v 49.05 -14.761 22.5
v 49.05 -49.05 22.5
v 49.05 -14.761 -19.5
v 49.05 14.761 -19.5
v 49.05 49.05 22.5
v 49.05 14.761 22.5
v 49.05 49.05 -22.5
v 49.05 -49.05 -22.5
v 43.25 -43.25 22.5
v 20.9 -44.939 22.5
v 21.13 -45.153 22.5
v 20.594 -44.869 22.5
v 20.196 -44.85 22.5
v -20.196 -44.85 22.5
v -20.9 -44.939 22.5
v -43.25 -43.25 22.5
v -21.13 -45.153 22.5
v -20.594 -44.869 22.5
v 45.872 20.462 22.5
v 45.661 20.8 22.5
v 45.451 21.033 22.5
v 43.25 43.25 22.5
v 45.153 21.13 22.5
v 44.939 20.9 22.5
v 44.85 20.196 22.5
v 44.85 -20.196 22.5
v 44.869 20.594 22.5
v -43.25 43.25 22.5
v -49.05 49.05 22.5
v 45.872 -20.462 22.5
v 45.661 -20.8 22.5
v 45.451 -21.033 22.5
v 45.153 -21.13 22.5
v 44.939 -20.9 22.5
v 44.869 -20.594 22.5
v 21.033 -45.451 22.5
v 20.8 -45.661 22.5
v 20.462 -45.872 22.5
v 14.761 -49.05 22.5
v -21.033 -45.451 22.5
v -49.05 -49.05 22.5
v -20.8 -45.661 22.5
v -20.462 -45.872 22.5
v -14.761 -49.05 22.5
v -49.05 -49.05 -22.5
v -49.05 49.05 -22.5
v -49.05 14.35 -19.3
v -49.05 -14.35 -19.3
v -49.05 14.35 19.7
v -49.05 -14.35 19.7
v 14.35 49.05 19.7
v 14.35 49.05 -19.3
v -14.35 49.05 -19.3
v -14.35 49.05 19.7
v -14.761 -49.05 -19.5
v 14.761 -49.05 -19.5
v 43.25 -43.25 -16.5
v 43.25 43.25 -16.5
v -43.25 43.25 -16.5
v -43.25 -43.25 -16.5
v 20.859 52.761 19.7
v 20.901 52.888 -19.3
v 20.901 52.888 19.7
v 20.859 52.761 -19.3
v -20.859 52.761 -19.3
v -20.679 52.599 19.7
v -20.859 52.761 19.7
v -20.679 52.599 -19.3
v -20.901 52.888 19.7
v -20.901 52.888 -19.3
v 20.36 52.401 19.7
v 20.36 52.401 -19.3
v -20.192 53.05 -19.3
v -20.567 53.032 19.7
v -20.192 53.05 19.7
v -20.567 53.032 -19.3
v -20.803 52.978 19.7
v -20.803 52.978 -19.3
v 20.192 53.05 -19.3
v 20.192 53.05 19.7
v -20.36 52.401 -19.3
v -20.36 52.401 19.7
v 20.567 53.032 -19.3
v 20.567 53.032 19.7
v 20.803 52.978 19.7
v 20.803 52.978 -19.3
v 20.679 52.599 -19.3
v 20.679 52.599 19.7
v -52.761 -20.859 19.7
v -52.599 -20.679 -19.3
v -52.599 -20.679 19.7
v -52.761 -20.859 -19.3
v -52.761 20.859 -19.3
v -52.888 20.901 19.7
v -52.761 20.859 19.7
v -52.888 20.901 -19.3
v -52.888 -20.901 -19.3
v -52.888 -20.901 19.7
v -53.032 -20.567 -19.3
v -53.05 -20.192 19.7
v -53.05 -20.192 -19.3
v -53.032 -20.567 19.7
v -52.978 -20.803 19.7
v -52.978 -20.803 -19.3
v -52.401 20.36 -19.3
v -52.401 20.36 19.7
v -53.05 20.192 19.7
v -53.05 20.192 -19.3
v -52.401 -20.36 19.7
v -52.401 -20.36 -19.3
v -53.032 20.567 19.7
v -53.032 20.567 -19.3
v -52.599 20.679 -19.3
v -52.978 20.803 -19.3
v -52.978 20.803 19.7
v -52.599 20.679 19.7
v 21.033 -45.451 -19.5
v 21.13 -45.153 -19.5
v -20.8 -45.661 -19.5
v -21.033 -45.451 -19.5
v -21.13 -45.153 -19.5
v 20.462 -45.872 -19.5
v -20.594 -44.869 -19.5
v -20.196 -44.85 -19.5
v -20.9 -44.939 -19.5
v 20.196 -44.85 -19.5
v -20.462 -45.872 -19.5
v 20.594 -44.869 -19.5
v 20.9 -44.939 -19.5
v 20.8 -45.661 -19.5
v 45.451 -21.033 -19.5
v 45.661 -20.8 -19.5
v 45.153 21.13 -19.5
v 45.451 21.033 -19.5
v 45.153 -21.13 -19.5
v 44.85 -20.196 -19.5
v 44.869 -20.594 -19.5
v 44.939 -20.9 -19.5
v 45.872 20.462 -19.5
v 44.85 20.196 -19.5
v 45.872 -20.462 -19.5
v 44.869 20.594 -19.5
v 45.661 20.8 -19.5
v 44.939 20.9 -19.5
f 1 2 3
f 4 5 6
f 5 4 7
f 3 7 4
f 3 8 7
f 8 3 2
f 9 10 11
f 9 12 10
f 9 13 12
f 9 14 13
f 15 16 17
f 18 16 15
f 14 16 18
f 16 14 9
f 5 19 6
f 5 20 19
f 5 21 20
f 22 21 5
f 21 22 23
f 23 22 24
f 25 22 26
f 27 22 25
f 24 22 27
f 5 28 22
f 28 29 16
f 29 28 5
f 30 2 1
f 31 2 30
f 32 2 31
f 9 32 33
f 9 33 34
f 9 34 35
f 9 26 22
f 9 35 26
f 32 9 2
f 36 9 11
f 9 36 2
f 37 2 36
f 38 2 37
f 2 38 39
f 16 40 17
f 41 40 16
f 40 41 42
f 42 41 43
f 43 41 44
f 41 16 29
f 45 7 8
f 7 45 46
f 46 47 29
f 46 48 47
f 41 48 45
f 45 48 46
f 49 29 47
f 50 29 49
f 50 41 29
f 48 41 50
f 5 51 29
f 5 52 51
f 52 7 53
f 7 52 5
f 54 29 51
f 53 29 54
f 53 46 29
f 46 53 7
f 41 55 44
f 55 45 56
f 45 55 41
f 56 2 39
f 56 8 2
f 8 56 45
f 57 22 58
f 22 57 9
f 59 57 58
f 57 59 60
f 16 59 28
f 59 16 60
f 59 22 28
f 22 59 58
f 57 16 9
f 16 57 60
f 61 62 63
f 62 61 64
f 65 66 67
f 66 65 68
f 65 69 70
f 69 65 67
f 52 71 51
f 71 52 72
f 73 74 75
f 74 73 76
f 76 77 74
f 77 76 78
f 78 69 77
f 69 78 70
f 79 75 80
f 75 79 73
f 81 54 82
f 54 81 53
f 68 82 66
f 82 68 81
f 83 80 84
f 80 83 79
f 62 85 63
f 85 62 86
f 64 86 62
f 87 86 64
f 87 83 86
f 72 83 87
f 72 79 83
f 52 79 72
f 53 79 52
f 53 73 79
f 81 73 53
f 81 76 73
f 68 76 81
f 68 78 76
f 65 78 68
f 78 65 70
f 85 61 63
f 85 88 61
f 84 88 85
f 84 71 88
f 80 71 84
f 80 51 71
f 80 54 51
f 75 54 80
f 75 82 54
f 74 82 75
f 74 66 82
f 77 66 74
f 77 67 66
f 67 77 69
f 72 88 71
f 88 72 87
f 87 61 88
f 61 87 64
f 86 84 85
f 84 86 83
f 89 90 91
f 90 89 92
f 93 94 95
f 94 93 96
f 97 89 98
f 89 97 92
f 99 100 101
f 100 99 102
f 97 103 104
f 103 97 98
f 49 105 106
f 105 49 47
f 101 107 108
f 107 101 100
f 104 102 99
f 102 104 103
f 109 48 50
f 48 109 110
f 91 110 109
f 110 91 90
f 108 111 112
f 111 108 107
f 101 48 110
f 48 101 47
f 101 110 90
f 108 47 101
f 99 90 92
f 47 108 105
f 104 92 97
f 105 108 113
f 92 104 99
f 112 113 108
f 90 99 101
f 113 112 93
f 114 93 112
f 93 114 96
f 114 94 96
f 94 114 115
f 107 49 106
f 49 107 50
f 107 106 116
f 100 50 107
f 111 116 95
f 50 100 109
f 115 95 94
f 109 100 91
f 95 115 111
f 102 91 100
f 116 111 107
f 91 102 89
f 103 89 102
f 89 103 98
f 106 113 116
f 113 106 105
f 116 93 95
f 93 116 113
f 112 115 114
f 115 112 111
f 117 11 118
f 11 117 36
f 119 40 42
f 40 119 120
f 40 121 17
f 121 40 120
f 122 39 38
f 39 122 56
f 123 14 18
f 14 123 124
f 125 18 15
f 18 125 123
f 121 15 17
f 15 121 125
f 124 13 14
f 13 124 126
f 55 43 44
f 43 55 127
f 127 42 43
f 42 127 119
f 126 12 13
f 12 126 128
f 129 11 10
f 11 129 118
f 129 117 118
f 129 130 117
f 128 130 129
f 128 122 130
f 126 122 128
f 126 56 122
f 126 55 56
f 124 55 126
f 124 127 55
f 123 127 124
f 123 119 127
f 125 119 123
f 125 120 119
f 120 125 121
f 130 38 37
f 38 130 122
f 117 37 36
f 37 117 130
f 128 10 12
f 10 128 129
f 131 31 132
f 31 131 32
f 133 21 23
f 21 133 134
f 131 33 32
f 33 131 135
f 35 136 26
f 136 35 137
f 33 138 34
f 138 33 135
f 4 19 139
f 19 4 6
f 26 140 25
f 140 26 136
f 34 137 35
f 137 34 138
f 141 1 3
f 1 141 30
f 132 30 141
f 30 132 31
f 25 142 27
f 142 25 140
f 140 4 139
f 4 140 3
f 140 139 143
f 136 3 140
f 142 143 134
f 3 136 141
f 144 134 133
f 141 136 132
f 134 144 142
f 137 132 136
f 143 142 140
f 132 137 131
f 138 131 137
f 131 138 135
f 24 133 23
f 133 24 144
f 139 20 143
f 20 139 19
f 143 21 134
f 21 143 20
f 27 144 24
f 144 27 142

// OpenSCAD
// file: bayonet-port-scad/utils/trapezium.scad
/**
 * @file trapezium.scad
 * @brief Create a trapezium shape with the given parameters
 * @author Cameron K. Brooks
 * @copyright 2026
 * @description Create a trapezium shape given the bottom width and optionally the top width, height, angle, and offset.
 * The default call using only the bottom width will create a trapezium with a top width equal to half the bottom width
 * and a height calculated from the default angle of 45 degrees.
 */

/**
 * @brief Create a trapezium shape with the given parameters
 * @param bottom_width The width of the bottom of the trapezium
 * @param top_width The width of the top of the trapezium
 * @param height The height of the trapezium
 * @param angle The angle of the trapezium sides
 * @param offset The offset of the top of the trapezium
 * @return The trapezium polygon
 */
module trapezium(bottom_width, top_width = undef, height = undef, angle = 45, offset = 0) {
  polygon(points=trapezium_pts(bottom_width, top_width, height, angle, offset));
}

/**
 * @brief Create a list of points that form a trapezium shape with the given parameters
 * @param bottom_width The width of the bottom of the trapezium
 * @param top_width The width of the top of the trapezium
 * @param height The height of the trapezium
 * @param angle The angle of the trapezium sides
 * @param offset The offset of the top of the trapezium
 * @return The points of the trapezium shape
 */
function trapezium_pts(bottom_width, top_width = undef, height = undef, angle = 45, offset = 0) =
  let (
    top_width = is_undef(top_width) ? // check top_width undef
      (
        is_undef(height) // check if height is undef
        ? bottom_width / 2 // if height is also undef, set top width to half of bottom width
        : bottom_width - 2 * height * tan(angle)
      ) // if height is provided, calculate top width
    : top_width, // if top width is provided, use it

    // Next calculate height if it is not provided
    height = is_undef(height) ? // check if height is undef
      (bottom_width - top_width) / (2 * tan(angle)) // calculate height based on the angle and width difference
    : height // if height is provided, use it
  ) [
      [-bottom_width / 2, 0], // Bottom left
      [bottom_width / 2, 0], // Bottom right
      [offset + top_width / 2, height], // Top right
      [offset - top_width / 2, height], // Top left
  ];
// file: bayonet-port-scad/utils/dovetail.scad
/**
 * @file dovetail.scad
 * @brief Dovetail cross section and prism, for keying parts together
 * @author Cameron K. Brooks
 * @copyright 2026
 * @description A dovetail is a trapezium stood on its narrow end: the root is narrow and the
 * crown splays out, so a tail slid into a matching socket cannot be pulled straight out. The
 * two crown corners are acute and are swept into a quasi arc rather than left as sharp points.
 *
 * The socket is the same profile grown by an allowance, so the tail and socket cannot drift
 * apart.
 */

use <trapezium.scad>;

// Unit vector from a towards b.
function _unit(a, b) = let (v = b - a, l = norm(v)) l == 0 ? [0, 0] : v / l;

// Quadratic bezier, with the sharp corner itself as the control point.
function _qbez(p0, p1, p2, t) =
  (1 - t) * (1 - t) * p0 + 2 * (1 - t) * t * p1 + t * t * p2;

// Replace corner c, whose neighbours along the path are a then b, with fn+1 points sweeping a
// quasi arc. The curve starts and ends setback away from c along each edge, so it is tangent
// to both, the neighbouring points do not move, and the arc only ever cuts into the corner.
function _round_corner(a, c, b, setback, fn) =
  let (
    p0 = c + _unit(c, a) * setback,
    p2 = c + _unit(c, b) * setback
  ) [for (i = [0:fn]) _qbez(p0, c, p2, i / fn)];

/**
 * @brief Points of a dovetail cross section, counter-clockwise from the root.
 * @param width          Width across the crown (the widest part)
 * @param height         Root-to-crown height
 * @param corner_setback How far back along each edge the crown arcs start; defaults to height/3
 * @param corner_fn      Segments per crown arc
 */
function dovetail_pts(width, height, corner_setback = undef, corner_fn = 6) =
  let (
    pts = trapezium_pts(bottom_width=width * 2 / 3, top_width=width, height=height),
    // pts is [root left, root right, crown right, crown left], counter-clockwise
    setback = is_undef(corner_setback) ? height / 3 : corner_setback
  ) concat(
    [pts[0], pts[1]],
    _round_corner(pts[1], pts[2], pts[3], setback, corner_fn), // crown right
    _round_corner(pts[2], pts[3], pts[0], setback, corner_fn) // crown left
  );

/**
 * @brief A dovetail prism, extruded along z from the origin.
 * @param length    Extrusion length
 * @param allowance Grows the profile all round; 0 for the tail, the fit clearance for the socket
 */
module dovetail(width, height, length, allowance = 0, corner_setback = undef, corner_fn = 6) {
  linear_extrude(height=length)
    offset(delta=allowance)
      polygon(dovetail_pts(width, height, corner_setback, corner_fn));
}
// main file
/**
 * @file support/bottle_holder.scad
 * @brief Stackable holder sleeve for media bottles
 * @author Cameron K. Brooks
 * @copyright 2026
 *
 * The sleeve is square, so it takes either a cylindrical or a square bottle of the given
 * diameter. sleeve_ratio sets how far up the bottle the sleeve reaches. Two pairs of
 * male-female dovetails on opposing faces let holders be stacked into a grid.
 */

use <bayonet-port-scad/utils/dovetail.scad>;

$fn = $preview ? 48 : 96;
z_fight = $preview ? 0.05 : 0; // z-fighting avoidance for preview

bottle_diameter = 86.1; // square bottle is 62.6mm, round bottle is 86.1
bottle_height = 130;

sleeve_ratio = 0.3;
wall_thickness = 6;
allowance = 0.2;

module dummy() {
  // stop the customizer detection from here onwards
}

// Derived

sleeve_height = bottle_height * sleeve_ratio;
outer_width = bottle_diameter + wall_thickness * 2;

dovetail_height = wall_thickness * 2 / 3;
dovetail_width = bottle_diameter / 2;

difference() {

  union() {
    // sleeve
    difference() {
      cube([outer_width, outer_width, sleeve_height + wall_thickness], center=true);
      translate([0, 0, wall_thickness / 2])
        cube([bottle_diameter + allowance * 2, bottle_diameter + allowance * 2, sleeve_height + z_fight], center=true);
    }

    // tails, on the +x and +y faces
    for (i = [0, 1])
      rotate([0, 0, i * 90])
        translate([0, outer_width / 2, -sleeve_height / 2 + allowance])
          dovetail(dovetail_width, dovetail_height, sleeve_height);
  }

  // sockets, on the -x and -y faces; grown by the allowance so a tail slides in
  for (i = [0, 1])
    rotate([0, 0, i * 90])
      translate([0, -outer_width / 2, -sleeve_height / 2])
        dovetail(dovetail_width, dovetail_height, sleeve_height * 2, allowance=allowance);
}
